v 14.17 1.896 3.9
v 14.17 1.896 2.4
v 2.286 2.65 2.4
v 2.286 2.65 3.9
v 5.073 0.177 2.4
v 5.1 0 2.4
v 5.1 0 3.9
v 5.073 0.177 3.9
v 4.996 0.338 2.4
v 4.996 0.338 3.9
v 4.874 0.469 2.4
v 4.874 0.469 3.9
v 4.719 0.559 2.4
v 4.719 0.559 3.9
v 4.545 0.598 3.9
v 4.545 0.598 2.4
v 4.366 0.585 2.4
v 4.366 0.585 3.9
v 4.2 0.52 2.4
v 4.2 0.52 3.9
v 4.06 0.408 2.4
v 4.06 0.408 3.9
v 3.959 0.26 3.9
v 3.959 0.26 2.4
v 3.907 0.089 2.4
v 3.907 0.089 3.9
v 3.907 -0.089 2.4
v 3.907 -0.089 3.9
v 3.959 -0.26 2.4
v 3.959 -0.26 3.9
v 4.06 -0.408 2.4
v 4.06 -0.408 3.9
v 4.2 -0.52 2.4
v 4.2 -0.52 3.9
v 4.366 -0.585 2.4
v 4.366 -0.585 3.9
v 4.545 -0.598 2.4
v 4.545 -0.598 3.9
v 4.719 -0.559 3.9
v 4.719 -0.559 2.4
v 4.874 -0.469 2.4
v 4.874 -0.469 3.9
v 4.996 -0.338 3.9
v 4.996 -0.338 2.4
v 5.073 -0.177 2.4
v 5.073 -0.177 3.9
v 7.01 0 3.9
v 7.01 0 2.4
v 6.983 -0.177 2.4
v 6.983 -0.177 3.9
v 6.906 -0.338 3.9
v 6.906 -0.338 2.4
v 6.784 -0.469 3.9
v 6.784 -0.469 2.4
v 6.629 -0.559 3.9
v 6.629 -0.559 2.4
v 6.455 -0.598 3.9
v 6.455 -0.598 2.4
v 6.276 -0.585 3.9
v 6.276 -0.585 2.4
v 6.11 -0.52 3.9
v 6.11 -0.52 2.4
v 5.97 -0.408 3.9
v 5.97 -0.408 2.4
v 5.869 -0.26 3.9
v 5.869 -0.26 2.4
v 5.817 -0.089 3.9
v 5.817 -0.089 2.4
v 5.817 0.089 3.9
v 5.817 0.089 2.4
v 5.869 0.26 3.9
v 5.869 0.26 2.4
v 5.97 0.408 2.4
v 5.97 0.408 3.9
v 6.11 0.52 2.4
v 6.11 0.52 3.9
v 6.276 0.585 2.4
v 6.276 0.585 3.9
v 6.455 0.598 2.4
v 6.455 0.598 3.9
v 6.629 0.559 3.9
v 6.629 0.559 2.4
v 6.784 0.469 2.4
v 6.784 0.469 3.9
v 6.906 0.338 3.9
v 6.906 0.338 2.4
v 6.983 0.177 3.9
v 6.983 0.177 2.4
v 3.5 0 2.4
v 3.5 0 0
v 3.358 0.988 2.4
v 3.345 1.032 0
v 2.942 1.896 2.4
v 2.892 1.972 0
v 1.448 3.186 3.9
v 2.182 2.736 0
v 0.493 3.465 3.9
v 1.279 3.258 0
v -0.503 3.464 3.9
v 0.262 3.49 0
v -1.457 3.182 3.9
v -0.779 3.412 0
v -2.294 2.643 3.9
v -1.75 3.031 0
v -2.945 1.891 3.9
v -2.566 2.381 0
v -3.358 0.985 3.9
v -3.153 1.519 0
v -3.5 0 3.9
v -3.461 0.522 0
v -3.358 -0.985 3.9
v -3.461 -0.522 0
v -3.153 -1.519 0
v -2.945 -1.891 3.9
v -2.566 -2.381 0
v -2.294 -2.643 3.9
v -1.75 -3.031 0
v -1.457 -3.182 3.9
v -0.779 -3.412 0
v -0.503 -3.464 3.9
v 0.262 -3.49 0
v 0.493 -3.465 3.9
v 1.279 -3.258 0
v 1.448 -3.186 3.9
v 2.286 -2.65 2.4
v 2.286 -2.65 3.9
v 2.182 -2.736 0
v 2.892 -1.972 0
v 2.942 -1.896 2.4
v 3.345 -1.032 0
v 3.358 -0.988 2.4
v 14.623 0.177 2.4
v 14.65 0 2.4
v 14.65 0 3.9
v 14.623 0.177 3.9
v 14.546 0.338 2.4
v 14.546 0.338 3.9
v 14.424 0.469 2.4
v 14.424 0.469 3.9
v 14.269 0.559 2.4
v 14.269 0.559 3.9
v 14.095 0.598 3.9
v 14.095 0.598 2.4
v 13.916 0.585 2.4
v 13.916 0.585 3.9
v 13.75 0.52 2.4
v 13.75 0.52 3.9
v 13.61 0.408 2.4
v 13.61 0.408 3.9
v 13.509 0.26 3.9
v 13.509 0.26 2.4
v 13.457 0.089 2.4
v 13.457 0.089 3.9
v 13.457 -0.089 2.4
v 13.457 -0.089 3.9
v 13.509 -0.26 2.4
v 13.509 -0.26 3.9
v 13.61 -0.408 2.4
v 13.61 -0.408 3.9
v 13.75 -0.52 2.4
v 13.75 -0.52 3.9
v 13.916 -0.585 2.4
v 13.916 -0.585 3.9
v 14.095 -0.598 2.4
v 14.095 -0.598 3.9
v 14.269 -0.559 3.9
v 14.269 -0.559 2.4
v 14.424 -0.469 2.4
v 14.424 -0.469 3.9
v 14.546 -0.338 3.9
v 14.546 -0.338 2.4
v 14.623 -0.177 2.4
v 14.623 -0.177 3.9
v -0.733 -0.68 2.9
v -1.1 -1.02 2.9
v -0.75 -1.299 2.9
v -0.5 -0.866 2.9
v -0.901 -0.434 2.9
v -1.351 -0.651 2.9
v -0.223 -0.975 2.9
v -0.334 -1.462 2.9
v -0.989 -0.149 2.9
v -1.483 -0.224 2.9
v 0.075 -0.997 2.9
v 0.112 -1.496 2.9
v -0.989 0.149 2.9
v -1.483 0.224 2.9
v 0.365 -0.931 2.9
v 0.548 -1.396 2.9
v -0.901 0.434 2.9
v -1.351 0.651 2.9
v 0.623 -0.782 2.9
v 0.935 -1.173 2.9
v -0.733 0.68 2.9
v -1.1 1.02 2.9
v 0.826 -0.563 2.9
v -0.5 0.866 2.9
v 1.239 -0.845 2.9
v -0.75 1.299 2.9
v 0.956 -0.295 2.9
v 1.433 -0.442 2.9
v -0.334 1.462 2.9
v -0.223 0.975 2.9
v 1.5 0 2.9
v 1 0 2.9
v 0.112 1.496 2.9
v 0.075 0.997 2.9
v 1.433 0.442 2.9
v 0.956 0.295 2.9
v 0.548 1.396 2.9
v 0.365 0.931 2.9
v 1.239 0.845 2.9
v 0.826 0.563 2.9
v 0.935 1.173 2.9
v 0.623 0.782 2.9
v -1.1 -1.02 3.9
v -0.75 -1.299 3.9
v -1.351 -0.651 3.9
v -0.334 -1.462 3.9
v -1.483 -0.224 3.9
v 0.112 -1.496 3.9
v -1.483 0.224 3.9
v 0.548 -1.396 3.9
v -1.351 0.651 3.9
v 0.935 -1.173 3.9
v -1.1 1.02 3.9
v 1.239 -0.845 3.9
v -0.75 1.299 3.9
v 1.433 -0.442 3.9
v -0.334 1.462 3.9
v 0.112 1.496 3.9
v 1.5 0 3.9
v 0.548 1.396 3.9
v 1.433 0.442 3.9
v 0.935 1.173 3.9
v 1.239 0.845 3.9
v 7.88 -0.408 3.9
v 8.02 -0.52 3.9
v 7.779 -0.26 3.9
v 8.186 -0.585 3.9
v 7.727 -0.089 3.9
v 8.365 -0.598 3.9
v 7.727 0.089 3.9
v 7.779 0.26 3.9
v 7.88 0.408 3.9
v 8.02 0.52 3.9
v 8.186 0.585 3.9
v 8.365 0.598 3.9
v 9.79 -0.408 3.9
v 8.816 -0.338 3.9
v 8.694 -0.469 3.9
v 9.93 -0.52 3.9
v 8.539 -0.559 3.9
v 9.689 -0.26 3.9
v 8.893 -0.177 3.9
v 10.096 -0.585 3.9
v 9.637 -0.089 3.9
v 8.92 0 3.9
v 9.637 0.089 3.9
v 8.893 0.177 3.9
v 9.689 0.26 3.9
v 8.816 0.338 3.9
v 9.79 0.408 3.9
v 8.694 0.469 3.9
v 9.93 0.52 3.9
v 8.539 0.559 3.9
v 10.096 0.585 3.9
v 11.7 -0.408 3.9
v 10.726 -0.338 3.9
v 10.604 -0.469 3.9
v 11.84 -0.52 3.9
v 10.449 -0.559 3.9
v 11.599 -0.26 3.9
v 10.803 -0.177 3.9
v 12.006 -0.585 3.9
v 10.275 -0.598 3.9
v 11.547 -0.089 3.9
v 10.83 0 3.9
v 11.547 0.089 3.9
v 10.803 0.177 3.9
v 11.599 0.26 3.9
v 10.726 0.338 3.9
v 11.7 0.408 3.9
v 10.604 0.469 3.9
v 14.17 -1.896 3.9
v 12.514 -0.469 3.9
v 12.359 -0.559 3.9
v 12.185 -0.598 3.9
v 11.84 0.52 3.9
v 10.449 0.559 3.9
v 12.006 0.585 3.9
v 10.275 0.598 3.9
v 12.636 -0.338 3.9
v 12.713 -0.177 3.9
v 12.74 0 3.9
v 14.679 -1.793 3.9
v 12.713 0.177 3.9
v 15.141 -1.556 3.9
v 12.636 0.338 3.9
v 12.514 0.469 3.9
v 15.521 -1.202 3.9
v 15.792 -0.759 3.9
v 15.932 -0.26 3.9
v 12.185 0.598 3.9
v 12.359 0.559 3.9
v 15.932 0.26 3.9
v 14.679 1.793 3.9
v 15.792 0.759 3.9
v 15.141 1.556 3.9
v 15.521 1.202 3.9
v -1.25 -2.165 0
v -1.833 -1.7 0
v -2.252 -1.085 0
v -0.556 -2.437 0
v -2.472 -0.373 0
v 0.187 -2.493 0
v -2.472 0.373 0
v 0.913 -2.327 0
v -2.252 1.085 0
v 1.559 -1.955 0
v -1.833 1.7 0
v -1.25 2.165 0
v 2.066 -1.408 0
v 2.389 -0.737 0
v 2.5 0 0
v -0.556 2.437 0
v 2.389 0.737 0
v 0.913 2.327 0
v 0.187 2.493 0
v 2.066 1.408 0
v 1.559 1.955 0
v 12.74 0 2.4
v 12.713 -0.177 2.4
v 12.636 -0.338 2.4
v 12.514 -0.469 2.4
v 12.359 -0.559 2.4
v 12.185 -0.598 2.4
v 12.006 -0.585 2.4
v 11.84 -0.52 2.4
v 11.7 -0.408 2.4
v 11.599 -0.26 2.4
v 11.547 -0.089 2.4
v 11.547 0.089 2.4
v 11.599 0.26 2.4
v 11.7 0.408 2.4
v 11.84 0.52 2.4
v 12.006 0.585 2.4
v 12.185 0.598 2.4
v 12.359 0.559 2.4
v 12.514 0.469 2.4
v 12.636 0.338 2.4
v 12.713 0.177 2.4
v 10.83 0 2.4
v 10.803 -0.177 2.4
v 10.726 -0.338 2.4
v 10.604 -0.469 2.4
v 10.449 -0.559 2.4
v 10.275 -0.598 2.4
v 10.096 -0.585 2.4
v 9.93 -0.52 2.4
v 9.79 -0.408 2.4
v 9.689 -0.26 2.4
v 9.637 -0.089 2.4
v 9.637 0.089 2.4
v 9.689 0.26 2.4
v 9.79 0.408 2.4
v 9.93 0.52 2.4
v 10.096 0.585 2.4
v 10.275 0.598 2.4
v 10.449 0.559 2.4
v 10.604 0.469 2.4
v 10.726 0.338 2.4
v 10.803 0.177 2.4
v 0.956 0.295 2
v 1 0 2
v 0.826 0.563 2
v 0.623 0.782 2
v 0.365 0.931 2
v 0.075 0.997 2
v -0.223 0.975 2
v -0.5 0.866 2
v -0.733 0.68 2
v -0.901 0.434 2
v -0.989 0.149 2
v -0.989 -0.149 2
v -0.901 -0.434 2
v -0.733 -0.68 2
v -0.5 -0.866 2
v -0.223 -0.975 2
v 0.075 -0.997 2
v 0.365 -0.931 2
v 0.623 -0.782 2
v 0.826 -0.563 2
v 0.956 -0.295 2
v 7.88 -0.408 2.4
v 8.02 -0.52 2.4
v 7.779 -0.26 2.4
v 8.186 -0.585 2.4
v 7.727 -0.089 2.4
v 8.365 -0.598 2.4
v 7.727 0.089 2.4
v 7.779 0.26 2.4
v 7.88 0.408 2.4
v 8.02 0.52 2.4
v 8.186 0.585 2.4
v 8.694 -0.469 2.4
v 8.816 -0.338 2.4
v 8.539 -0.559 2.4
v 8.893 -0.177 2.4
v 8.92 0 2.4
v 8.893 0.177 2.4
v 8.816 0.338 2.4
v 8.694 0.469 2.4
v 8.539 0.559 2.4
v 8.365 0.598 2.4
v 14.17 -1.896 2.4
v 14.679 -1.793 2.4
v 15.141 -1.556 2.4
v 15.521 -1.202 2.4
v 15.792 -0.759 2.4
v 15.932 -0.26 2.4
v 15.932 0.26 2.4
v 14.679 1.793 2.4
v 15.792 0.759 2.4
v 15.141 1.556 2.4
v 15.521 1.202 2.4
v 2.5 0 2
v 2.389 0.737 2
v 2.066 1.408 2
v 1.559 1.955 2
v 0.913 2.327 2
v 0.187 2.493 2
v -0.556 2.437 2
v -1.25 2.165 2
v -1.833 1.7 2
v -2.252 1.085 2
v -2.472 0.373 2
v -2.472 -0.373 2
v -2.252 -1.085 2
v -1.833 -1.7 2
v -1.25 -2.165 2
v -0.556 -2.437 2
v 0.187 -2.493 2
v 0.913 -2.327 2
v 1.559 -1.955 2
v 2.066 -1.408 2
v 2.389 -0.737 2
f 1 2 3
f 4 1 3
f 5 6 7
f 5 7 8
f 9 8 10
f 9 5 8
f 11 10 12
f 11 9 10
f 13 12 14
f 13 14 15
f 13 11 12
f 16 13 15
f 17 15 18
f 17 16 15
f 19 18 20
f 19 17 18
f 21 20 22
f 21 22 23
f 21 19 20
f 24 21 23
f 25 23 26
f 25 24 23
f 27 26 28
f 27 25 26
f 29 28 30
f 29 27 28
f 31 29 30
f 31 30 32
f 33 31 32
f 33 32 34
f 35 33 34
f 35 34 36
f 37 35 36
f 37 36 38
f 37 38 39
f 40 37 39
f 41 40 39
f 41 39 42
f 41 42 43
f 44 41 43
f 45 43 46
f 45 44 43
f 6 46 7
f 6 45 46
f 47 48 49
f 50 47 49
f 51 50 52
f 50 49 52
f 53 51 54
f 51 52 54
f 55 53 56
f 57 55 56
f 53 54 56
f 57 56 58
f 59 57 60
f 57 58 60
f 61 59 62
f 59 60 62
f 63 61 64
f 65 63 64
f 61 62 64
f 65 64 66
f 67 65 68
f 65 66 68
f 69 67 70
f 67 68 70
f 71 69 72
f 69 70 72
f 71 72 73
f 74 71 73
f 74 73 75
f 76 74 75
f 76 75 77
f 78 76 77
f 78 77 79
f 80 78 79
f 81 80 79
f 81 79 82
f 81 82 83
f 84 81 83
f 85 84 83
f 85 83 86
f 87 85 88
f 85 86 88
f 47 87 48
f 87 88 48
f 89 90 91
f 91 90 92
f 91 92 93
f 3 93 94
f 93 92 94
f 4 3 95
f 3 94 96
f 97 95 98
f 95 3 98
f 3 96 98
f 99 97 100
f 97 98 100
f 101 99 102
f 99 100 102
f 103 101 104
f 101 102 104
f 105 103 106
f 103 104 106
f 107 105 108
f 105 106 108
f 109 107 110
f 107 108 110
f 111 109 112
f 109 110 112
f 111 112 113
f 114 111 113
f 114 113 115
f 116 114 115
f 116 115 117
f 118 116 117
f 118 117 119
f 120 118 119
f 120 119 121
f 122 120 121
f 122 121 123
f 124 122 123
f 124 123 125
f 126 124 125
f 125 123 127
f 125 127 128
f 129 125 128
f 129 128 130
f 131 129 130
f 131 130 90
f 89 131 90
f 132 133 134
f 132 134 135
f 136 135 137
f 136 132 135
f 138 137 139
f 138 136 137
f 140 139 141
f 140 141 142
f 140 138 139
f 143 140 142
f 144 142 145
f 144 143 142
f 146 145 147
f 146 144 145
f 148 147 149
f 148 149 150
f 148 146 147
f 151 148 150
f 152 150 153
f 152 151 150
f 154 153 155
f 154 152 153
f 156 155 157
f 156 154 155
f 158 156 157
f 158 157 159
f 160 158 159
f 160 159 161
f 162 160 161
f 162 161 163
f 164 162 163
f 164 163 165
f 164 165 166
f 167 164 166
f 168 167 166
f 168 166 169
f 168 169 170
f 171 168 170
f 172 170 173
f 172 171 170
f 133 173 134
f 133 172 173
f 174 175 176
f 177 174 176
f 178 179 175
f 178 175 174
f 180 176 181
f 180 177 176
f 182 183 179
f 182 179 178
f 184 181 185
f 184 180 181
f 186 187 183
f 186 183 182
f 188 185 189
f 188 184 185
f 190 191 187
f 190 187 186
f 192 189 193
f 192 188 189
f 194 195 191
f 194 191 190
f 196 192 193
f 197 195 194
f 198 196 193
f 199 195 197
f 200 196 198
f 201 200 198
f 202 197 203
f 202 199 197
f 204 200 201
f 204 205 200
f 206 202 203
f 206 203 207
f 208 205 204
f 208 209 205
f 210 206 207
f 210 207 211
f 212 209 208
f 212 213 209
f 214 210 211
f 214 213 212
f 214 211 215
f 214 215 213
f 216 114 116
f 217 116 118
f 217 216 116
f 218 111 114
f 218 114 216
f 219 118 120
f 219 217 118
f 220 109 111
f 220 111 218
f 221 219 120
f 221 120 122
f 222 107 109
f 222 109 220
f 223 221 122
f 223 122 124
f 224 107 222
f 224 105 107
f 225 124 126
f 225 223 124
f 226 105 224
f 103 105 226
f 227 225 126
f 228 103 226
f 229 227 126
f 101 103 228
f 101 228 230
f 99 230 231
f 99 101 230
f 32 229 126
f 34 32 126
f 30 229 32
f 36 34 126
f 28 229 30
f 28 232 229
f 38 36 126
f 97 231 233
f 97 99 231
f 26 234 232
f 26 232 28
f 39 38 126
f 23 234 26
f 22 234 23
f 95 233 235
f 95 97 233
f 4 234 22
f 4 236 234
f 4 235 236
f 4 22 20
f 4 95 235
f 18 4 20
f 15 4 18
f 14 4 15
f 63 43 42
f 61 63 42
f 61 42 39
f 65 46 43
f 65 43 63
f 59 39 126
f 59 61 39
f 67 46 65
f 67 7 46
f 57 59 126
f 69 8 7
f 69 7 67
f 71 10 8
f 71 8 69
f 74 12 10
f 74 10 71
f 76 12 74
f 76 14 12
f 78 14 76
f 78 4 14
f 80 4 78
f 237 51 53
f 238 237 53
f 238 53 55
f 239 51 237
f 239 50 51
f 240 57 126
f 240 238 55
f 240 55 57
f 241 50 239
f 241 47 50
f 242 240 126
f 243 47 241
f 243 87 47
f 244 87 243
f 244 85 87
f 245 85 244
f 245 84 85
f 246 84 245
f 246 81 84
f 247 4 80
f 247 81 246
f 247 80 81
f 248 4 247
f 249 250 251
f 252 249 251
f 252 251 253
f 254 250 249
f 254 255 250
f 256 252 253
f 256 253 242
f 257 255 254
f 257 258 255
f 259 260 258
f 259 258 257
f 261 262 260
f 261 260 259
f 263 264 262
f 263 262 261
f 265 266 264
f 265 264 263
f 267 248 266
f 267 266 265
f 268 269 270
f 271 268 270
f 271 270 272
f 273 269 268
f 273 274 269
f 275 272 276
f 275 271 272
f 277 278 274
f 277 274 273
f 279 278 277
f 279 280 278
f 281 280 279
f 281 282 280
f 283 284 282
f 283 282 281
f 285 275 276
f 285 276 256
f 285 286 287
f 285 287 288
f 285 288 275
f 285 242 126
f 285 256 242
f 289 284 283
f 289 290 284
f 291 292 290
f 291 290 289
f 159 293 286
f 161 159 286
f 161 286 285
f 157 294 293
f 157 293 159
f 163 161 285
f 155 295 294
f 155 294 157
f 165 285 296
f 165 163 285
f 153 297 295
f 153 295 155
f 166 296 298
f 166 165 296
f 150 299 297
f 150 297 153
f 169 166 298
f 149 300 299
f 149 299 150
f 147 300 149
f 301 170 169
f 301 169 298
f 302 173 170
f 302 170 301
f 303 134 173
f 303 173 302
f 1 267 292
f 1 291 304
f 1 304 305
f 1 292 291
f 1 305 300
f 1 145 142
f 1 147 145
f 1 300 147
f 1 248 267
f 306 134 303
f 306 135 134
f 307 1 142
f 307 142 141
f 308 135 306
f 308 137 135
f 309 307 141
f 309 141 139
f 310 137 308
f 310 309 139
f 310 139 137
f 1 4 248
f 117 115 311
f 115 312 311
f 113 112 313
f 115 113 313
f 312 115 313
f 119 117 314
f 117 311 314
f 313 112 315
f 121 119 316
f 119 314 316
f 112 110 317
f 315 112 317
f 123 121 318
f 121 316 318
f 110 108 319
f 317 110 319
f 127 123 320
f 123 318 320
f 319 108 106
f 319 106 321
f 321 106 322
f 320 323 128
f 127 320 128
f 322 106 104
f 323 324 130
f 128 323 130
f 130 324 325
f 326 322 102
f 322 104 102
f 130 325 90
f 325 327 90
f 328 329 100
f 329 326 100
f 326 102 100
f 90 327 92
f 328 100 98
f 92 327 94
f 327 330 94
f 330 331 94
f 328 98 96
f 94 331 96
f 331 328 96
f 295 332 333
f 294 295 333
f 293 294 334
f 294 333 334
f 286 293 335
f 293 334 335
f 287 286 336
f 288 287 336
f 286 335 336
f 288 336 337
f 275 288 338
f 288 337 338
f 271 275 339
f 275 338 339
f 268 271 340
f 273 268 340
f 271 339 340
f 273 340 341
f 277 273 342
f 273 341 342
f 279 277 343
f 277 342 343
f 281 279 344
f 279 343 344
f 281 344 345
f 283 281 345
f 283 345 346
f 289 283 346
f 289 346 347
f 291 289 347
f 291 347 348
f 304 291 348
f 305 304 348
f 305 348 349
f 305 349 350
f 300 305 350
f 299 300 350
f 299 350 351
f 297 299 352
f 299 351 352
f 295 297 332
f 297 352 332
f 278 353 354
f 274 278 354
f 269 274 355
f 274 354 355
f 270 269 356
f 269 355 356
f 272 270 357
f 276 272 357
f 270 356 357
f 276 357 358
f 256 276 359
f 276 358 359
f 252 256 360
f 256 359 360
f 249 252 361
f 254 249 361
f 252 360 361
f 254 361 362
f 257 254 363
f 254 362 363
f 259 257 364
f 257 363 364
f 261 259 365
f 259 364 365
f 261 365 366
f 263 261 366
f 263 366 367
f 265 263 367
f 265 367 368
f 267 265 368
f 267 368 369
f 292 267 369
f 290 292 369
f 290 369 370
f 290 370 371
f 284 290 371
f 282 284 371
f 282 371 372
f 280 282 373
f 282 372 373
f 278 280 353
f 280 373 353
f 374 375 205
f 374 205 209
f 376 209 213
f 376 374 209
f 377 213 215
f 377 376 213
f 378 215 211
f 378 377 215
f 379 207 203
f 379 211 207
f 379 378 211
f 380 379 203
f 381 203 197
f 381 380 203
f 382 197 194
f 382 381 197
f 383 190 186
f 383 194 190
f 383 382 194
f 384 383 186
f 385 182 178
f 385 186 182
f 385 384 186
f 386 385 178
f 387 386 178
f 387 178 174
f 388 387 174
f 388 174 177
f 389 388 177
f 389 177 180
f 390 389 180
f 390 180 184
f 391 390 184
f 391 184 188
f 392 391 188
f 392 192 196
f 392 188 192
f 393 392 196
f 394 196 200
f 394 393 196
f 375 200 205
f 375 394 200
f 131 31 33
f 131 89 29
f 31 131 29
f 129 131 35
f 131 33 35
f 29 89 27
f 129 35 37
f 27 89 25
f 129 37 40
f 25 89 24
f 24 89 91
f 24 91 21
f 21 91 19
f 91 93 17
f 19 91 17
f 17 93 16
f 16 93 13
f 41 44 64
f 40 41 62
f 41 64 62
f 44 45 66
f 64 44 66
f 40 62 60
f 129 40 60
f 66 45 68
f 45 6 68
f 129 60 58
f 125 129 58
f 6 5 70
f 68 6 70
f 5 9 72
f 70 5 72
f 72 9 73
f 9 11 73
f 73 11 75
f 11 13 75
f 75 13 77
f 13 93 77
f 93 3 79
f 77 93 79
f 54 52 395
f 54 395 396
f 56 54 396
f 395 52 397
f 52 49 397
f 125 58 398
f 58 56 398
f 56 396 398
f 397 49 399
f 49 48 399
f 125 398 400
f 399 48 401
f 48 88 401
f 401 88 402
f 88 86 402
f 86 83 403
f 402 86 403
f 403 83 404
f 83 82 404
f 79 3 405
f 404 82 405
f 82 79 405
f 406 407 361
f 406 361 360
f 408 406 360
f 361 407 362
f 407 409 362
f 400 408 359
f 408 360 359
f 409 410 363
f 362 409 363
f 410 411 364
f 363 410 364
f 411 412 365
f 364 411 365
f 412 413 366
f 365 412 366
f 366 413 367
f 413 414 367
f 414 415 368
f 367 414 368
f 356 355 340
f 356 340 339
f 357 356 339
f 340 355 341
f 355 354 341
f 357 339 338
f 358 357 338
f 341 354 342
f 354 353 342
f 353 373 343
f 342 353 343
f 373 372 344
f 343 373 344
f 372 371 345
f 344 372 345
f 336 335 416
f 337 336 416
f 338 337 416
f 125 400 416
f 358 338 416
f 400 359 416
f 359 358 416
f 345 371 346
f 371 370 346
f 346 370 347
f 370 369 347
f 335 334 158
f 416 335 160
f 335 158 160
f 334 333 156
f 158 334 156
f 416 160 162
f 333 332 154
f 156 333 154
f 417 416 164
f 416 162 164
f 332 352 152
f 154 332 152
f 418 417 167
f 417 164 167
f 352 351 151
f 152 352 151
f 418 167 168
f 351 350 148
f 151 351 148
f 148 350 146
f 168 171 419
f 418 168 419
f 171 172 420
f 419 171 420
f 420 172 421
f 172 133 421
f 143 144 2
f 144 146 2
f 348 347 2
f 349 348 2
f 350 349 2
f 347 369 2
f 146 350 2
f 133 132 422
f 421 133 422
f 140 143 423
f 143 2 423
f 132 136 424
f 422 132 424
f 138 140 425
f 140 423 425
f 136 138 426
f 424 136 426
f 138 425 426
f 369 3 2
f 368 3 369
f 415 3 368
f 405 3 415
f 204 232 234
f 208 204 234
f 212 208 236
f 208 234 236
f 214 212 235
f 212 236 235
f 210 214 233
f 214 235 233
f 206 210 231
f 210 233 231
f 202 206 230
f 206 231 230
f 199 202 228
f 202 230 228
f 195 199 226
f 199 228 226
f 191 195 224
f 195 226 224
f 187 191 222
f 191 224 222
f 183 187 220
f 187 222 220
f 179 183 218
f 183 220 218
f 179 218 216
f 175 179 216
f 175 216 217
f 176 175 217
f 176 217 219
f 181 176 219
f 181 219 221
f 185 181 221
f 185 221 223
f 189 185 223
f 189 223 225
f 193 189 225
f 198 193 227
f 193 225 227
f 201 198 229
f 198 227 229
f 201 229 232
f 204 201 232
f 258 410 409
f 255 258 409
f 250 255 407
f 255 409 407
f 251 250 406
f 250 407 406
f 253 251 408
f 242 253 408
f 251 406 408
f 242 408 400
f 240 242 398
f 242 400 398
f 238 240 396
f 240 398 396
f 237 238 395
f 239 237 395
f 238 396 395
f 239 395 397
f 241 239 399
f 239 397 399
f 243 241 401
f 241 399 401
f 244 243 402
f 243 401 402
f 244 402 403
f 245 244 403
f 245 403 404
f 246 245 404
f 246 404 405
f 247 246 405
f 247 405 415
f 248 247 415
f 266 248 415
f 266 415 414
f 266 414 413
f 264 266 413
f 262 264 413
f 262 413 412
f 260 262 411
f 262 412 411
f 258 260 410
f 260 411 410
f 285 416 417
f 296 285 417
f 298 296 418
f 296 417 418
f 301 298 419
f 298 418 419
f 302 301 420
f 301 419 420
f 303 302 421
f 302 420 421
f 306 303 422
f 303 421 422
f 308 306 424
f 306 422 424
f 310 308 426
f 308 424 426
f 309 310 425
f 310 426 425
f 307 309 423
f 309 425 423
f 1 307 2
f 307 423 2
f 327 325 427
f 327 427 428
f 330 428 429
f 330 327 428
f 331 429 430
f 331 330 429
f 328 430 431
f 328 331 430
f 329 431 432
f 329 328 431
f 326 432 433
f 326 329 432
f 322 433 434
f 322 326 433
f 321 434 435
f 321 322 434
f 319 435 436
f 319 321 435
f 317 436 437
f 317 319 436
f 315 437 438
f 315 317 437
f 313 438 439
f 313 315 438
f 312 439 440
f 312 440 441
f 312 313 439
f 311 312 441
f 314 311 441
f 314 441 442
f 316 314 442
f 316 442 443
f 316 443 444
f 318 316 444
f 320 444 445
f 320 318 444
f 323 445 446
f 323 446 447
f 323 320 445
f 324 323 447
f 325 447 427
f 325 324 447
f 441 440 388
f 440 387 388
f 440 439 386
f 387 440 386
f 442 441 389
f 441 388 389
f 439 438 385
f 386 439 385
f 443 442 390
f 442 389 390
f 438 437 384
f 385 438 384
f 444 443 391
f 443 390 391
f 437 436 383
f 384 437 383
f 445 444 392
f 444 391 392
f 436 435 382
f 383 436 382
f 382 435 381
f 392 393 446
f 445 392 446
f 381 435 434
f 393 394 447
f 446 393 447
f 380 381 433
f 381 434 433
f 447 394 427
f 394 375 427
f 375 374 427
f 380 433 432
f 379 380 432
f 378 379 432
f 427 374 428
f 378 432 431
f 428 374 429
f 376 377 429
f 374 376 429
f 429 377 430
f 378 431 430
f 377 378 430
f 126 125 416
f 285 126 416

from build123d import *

# Parameters (mm, degrees)
SKETCH_1_R          = 3.5
EXTRUDE_1_DEPTH     = 3.9
EXTRUDE_START       = 2.4
SKETCH_1_6_R        = 0.6
EXTRUDE_2_DEPTH     = 1.5
SKETCH_1_3_R        = 2.5
CUT_EXTRUDE_1_DEPTH = 2
CUT_EXTRUDE_START   = 3.9
SKETCH_1_4_R        = 1.5
CUT_EXTRUDE_2_DEPTH = 1
SKETCH_1_5_R        = 1
CUT_EXTRUDE_3_DEPTH = 17.788761122


with BuildPart() as part:
    # 草图1 → 凸台-拉伸1 (new body)
    with BuildSketch(Plane.XY):
        Circle(SKETCH_1_R)
    extrude(amount=EXTRUDE_1_DEPTH)

    # 草图1<6> → 凸台-拉伸2 (add)
    with BuildSketch(Plane.XY.offset(EXTRUDE_START)):
        with BuildLine():
            Line((14.170277633, 1.89618915), (2.286372673, 2.65))
            ThreePointArc((2.286372673, 2.65), (3.5, 0), (2.286372673, -2.65))
            Line((2.286372673, -2.65), (14.170277633, -1.89618915))
            ThreePointArc((14.170277633, -1.89618915), (15.95, 0), (14.170277633, 1.89618915))
        make_face()
        with BuildLine():
            ThreePointArc((11.54, 0), (12.14, 0.6), (12.74, 0))
            ThreePointArc((12.74, 0), (12.14, -0.6), (11.54, 0))
        make_face(mode=Mode.SUBTRACT)
        with Locations((4.5, 0)):
            Circle(SKETCH_1_6_R, mode=Mode.SUBTRACT)
        with BuildLine():
            ThreePointArc((5.81, 0), (6.41, 0.6), (7.01, 0))
            ThreePointArc((7.01, 0), (6.41, -0.6), (5.81, 0))
        make_face(mode=Mode.SUBTRACT)
        with BuildLine():
            ThreePointArc((7.72, 0), (8.32, 0.6), (8.92, 0))
            ThreePointArc((8.92, 0), (8.32, -0.6), (7.72, 0))
        make_face(mode=Mode.SUBTRACT)
        with BuildLine():
            ThreePointArc((9.63, 0), (10.23, 0.6), (10.83, 0))
            ThreePointArc((10.83, 0), (10.23, -0.6), (9.63, 0))
        make_face(mode=Mode.SUBTRACT)
        with Locations((14.05, 0)):
            Circle(SKETCH_1_6_R, mode=Mode.SUBTRACT)
    extrude(amount=EXTRUDE_2_DEPTH)

    # 草图1<3> → 切除-拉伸1 (cut)
    with BuildSketch(Plane.XY):
        Circle(SKETCH_1_3_R)
    extrude(amount=CUT_EXTRUDE_1_DEPTH, mode=Mode.SUBTRACT)

    # 草图1<4> → 切除-拉伸2 (cut)
    with BuildSketch(Plane.XY.offset(CUT_EXTRUDE_START)):
        Circle(SKETCH_1_4_R)
    extrude(amount=-CUT_EXTRUDE_2_DEPTH, mode=Mode.SUBTRACT)

    # 草图1<5> → 切除-拉伸3 (cut, through all)
    with BuildSketch(Plane.XY):
        Circle(SKETCH_1_5_R)
    extrude(amount=CUT_EXTRUDE_3_DEPTH, mode=Mode.SUBTRACT)


solid = part.part
